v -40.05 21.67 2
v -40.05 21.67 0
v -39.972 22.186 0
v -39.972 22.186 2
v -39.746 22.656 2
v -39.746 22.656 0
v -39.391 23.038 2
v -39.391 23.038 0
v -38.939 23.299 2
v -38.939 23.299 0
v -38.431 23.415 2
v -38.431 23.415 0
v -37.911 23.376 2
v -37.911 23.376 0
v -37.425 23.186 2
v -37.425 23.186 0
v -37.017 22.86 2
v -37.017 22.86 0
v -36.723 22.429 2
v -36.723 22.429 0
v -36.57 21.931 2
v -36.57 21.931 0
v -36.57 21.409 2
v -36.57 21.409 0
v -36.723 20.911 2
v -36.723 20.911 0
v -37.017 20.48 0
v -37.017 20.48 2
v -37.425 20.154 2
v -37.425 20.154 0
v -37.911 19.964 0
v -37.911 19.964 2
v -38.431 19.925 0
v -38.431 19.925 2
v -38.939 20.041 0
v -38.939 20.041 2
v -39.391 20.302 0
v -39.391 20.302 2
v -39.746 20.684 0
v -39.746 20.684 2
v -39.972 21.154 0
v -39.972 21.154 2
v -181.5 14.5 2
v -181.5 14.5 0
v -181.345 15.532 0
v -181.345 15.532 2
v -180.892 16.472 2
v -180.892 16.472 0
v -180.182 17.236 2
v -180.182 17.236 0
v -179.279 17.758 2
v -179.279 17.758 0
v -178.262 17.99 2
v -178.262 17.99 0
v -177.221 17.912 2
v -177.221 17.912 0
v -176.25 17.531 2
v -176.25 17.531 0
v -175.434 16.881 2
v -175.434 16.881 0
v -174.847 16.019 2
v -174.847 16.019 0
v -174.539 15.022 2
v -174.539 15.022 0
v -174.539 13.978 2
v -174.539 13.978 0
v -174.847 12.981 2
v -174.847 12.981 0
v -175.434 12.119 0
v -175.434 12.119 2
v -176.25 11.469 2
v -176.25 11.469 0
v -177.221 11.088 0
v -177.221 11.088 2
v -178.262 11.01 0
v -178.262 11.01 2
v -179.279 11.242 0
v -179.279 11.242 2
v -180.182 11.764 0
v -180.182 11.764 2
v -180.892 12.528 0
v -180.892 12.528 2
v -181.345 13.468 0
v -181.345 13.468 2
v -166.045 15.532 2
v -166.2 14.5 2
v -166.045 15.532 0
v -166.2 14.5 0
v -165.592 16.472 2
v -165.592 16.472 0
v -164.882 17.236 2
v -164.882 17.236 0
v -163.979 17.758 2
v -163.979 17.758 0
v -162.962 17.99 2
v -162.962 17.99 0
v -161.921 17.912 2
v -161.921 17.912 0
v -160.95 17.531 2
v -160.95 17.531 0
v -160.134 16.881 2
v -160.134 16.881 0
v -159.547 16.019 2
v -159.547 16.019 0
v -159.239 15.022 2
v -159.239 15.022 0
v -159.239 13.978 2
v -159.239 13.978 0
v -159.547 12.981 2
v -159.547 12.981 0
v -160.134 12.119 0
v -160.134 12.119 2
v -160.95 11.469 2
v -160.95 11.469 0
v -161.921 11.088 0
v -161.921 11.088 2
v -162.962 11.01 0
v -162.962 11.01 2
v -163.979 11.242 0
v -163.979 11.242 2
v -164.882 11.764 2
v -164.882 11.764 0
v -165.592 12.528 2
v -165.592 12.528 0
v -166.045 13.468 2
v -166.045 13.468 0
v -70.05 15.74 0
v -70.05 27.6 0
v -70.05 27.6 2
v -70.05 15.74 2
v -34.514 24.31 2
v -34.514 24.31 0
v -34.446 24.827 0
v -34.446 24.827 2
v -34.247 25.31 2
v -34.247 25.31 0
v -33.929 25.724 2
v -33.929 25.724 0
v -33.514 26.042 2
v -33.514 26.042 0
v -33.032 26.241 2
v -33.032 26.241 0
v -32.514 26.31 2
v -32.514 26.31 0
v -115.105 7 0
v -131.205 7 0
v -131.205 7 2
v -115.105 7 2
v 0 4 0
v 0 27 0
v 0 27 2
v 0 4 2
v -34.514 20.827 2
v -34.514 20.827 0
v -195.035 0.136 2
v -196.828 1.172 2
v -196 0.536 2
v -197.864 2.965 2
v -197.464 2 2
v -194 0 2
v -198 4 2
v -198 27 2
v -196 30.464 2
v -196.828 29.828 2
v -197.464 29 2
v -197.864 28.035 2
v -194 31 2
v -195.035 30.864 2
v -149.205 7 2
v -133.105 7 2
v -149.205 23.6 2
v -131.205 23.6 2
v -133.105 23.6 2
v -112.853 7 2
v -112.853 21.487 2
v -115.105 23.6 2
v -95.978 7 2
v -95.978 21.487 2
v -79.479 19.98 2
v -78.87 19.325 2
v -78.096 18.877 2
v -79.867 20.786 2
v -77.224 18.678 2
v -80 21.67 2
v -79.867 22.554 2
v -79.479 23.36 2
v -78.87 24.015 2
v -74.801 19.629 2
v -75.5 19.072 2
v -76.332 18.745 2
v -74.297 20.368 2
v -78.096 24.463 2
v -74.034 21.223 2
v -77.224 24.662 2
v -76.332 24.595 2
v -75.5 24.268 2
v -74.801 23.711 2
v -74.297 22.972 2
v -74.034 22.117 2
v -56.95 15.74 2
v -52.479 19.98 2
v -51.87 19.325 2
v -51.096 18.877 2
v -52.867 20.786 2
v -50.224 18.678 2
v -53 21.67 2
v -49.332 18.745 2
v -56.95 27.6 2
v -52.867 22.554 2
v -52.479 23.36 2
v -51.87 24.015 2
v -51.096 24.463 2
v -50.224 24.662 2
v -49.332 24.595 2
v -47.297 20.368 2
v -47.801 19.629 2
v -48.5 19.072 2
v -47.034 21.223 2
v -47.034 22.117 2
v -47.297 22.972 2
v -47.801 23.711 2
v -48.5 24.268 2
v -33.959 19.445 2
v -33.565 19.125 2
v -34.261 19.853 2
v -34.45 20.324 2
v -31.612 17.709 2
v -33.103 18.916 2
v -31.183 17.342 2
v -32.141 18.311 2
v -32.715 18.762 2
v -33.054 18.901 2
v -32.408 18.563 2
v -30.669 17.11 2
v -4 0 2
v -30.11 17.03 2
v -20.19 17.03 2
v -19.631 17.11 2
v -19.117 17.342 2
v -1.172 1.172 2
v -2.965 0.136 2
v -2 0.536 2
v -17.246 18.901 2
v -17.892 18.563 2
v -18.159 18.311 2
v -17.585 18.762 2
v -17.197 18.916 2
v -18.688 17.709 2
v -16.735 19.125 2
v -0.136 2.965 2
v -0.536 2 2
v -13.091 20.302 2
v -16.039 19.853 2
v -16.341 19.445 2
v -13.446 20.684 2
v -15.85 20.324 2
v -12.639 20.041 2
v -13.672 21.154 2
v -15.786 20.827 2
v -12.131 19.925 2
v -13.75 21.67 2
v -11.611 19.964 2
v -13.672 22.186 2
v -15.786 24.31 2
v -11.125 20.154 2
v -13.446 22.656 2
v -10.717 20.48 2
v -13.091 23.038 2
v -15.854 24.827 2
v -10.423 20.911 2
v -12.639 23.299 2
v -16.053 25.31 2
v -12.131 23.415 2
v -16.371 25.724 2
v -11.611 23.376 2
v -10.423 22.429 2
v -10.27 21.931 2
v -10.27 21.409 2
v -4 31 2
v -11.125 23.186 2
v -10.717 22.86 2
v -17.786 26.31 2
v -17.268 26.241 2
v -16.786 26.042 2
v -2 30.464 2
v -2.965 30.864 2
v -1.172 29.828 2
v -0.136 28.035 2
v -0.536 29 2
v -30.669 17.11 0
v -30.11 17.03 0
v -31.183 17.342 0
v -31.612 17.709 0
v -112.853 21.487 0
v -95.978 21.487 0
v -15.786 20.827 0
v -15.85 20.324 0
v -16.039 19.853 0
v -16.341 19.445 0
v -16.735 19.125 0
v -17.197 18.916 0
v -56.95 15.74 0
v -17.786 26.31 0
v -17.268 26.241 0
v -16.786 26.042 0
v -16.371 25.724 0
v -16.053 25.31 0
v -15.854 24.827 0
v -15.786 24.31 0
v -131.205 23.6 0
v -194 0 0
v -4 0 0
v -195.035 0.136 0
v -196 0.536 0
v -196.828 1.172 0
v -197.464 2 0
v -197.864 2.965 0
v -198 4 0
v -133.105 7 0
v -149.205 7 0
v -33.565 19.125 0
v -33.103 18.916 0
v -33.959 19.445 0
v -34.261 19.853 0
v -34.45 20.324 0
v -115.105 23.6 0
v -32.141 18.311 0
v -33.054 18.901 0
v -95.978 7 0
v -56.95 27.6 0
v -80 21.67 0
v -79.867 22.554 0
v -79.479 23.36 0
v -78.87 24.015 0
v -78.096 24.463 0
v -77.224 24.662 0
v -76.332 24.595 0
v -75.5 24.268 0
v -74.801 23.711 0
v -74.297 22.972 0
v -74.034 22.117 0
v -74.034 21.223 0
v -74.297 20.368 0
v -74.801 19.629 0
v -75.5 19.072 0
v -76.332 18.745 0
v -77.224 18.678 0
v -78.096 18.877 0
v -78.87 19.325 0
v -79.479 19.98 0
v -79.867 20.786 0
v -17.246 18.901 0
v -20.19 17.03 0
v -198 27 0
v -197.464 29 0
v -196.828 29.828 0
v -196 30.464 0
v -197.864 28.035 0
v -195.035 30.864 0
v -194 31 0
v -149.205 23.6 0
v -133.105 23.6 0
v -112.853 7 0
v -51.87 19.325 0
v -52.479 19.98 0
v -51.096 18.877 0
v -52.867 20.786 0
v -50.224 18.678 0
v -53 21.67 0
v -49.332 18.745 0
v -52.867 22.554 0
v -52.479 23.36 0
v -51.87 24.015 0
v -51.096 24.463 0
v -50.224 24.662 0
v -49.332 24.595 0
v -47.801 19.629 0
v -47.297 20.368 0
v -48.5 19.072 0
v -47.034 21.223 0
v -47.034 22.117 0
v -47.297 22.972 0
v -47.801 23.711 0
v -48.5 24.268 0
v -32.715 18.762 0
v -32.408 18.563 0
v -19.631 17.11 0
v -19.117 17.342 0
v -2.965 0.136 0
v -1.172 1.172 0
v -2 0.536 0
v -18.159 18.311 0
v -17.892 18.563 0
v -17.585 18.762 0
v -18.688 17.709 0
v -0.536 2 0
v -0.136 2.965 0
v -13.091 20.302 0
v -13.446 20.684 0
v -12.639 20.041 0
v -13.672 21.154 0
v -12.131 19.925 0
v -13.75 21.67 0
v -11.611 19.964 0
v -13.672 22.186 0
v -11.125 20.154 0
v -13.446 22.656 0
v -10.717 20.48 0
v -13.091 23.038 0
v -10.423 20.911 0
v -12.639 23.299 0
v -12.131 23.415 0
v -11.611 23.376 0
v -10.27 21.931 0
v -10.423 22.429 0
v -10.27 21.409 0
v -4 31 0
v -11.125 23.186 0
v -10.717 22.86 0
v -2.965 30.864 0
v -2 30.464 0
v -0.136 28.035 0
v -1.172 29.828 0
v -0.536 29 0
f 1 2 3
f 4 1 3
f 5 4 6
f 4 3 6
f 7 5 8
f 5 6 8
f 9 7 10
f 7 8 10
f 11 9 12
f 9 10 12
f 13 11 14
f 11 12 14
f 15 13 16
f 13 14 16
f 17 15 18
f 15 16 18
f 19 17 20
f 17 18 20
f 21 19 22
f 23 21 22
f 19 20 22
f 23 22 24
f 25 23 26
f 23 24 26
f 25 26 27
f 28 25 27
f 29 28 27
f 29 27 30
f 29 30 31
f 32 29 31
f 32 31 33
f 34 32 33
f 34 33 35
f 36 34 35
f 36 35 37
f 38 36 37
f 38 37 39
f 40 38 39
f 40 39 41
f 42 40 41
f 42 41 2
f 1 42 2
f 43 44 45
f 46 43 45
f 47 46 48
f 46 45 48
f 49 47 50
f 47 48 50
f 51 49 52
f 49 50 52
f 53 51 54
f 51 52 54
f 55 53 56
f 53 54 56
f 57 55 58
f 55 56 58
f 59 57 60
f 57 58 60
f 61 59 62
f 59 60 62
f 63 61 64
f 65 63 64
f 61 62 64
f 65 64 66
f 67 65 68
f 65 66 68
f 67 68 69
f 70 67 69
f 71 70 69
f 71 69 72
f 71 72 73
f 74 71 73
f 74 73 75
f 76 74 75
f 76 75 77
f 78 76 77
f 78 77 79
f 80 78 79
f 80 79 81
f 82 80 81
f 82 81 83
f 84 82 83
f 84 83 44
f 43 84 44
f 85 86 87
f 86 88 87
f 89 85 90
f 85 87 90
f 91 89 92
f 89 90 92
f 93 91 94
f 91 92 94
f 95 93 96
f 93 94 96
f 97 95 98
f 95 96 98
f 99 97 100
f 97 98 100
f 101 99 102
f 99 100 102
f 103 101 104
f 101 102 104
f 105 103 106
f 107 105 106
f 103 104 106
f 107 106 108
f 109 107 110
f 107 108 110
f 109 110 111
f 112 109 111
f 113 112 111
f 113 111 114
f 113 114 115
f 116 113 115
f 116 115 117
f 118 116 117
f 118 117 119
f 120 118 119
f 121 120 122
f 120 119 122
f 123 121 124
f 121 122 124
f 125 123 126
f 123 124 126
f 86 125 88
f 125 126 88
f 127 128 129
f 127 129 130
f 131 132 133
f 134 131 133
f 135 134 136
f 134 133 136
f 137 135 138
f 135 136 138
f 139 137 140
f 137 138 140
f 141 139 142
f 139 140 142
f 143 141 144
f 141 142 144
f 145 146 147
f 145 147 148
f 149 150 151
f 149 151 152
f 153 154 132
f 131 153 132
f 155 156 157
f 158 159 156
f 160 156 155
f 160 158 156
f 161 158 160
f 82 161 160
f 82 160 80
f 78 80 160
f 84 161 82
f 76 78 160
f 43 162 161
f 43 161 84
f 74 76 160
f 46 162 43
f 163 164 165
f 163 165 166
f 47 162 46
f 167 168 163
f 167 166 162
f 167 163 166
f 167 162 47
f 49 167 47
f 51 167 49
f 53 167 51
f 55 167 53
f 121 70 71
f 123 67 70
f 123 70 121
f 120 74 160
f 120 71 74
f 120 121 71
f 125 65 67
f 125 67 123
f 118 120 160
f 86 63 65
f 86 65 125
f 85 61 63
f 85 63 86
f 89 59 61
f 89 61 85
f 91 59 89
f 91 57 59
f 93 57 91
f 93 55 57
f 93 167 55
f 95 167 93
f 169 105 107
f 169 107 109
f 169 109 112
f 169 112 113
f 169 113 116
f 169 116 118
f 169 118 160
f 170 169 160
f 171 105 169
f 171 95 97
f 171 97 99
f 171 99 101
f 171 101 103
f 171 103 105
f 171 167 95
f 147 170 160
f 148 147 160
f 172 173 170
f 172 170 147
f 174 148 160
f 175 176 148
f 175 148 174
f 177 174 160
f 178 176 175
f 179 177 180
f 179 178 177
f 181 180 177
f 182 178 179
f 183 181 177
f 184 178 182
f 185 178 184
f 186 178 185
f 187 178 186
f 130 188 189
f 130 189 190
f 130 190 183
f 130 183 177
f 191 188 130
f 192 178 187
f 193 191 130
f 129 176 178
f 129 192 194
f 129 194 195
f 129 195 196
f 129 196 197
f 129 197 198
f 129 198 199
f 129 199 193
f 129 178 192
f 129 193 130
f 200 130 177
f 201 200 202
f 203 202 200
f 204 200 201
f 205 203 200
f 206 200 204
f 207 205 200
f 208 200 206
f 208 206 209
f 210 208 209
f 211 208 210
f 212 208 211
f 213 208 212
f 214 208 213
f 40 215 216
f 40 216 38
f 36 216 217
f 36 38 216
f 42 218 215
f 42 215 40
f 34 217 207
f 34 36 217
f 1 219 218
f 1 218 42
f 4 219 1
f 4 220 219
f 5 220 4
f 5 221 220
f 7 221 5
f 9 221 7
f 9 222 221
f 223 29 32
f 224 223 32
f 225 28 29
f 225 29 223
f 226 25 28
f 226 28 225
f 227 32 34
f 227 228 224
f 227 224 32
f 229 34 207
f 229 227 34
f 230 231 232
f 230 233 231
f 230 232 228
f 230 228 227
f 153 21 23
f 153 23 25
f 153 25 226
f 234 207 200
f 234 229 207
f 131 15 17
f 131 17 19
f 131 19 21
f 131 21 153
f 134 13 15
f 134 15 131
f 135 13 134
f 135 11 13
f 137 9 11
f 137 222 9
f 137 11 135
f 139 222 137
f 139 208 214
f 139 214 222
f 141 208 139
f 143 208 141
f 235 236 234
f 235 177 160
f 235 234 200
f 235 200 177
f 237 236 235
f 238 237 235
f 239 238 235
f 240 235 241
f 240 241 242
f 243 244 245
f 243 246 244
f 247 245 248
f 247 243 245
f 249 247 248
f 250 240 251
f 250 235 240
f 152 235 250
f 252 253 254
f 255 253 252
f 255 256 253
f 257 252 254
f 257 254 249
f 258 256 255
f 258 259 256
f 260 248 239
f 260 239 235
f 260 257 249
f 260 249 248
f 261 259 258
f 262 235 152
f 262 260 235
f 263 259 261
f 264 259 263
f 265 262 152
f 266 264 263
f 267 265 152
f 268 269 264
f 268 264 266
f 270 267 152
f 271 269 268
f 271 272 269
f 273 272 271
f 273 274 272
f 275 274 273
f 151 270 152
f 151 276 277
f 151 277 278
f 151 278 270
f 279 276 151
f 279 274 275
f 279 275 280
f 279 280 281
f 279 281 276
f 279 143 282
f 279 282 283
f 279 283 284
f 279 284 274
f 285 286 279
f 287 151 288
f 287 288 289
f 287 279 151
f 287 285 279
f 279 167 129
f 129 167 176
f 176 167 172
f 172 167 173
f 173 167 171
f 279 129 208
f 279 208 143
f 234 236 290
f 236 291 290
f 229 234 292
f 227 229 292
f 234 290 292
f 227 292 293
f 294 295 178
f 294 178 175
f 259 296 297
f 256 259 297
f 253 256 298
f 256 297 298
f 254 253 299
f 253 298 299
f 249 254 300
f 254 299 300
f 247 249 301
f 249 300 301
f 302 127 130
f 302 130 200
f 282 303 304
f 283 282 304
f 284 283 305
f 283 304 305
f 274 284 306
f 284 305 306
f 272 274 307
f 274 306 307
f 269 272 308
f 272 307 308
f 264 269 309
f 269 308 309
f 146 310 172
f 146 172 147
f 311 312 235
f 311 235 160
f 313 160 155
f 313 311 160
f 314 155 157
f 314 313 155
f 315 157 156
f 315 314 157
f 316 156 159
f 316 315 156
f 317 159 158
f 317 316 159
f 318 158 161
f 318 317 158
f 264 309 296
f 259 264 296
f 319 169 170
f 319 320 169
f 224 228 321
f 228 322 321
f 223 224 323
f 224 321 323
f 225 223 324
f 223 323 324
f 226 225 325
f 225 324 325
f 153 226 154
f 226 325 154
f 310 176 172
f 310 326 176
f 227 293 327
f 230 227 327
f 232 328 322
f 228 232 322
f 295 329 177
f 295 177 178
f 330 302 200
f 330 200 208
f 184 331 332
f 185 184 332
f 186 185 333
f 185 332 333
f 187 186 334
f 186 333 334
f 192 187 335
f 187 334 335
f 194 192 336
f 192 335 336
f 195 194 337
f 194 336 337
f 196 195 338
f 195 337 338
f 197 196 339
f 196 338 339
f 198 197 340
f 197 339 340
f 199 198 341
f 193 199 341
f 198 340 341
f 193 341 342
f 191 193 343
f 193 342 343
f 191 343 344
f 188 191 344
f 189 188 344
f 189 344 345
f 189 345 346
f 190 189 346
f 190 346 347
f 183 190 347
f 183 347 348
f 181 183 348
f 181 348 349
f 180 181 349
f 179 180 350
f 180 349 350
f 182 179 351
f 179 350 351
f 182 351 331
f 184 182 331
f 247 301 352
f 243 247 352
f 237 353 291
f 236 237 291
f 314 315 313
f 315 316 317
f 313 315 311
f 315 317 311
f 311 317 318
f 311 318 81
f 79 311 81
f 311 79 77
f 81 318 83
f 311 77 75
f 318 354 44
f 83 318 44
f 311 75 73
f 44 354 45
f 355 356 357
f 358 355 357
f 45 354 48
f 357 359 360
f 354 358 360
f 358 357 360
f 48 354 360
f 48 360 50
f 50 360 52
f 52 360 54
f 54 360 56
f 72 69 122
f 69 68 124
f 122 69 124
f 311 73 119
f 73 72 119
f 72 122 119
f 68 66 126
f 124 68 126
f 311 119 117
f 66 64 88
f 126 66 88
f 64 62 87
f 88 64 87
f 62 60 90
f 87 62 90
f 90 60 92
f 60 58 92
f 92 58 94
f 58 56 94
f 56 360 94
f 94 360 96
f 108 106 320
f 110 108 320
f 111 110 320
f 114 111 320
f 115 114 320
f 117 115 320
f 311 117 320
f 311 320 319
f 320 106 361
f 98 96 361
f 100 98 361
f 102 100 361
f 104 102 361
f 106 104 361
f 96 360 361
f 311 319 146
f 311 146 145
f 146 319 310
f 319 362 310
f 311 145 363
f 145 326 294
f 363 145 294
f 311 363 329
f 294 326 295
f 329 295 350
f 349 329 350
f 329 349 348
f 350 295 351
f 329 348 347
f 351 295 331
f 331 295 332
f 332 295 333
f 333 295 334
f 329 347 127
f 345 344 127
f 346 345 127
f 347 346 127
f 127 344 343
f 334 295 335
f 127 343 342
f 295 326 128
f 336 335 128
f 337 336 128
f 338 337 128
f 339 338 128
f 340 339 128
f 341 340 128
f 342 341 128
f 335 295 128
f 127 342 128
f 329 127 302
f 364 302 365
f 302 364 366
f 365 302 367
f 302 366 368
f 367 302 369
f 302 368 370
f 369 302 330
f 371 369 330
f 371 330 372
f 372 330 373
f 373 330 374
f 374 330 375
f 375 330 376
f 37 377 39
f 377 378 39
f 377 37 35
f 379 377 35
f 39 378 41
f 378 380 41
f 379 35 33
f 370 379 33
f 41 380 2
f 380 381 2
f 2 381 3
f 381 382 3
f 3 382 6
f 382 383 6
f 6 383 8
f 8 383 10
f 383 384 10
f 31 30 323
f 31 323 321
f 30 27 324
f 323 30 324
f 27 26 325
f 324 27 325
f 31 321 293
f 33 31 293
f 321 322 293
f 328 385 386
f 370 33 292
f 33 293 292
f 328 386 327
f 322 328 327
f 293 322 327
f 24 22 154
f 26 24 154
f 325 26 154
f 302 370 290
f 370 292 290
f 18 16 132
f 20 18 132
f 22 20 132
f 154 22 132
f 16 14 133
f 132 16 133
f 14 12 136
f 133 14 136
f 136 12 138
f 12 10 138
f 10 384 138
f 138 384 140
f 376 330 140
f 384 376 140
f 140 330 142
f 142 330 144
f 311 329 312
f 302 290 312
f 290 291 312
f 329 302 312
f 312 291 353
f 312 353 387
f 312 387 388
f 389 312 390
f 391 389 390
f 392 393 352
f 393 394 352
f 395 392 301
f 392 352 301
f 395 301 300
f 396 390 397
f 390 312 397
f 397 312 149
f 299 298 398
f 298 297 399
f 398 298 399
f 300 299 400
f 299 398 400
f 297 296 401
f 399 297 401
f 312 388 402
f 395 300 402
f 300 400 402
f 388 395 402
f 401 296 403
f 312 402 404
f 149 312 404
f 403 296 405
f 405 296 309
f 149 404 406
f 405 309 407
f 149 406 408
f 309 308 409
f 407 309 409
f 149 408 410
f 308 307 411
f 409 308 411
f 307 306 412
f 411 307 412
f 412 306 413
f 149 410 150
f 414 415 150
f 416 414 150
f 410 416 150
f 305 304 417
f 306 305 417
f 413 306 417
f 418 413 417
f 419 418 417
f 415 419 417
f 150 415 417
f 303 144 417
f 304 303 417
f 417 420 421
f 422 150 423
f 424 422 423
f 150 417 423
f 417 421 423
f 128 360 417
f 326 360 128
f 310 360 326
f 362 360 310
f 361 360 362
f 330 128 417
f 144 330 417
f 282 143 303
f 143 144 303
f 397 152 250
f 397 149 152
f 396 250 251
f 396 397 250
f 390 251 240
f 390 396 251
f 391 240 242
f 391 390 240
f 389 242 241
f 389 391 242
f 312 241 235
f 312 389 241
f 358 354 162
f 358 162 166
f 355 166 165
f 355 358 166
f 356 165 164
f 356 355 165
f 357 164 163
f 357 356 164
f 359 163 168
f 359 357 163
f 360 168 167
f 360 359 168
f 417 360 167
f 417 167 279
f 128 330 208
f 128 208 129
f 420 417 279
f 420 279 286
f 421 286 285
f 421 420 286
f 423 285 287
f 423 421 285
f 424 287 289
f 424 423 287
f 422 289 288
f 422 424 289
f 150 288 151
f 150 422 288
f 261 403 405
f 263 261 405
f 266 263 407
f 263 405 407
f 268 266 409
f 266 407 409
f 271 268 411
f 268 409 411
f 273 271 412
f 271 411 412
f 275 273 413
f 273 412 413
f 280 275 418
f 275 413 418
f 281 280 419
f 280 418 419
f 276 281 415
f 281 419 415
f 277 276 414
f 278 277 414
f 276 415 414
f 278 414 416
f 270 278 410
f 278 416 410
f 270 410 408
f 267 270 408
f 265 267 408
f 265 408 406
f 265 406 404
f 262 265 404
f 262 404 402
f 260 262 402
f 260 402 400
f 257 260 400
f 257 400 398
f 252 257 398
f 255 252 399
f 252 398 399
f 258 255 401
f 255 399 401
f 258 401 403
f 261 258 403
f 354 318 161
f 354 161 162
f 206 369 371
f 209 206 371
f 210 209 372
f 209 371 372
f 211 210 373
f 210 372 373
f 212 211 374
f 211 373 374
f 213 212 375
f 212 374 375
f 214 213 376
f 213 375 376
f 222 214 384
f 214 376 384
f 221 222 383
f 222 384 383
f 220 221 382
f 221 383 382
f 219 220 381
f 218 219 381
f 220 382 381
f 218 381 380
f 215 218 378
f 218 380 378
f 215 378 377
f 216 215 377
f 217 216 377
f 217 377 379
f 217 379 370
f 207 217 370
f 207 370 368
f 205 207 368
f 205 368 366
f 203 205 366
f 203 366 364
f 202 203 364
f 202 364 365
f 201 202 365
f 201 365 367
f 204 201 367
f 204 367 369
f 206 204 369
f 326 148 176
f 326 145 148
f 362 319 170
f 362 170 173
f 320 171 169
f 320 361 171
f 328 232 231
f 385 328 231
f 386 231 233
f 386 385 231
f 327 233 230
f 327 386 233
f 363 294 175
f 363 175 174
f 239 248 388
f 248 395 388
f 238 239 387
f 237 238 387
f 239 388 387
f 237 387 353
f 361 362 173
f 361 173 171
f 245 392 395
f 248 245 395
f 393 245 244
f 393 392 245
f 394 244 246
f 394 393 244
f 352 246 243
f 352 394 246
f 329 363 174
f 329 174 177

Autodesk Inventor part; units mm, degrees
ref_plane "YZ Plane" through (0, 0, 0) normal (1, 0, 0) x (0, 1, 0)
ref_plane "XZ Plane" through (0, 0, 0) normal (0, 1, 0) x (-1, 0, 0)
ref_plane "XY Plane" through (0, 0, 0) normal (0, 0, 1) x (1, 0, 0)
sketch "Sketch1" plane through (0, 0, 0) normal (0, 0, 1) x (1, 0, 0)
  line L0 (-4, 0) -> (-194, 0)
  line L1 (-198, 4) -> (-198, 27)
  line L2 (-194, 31) -> (-4, 31)
  line L3 (0, 27) -> (0, 4)
  arc A0 (0, 27) -> (-4, 31) centre (-4, 27) ccw
  arc A1 (-194, 31) -> (-198, 27) centre (-194, 27) ccw
  arc A2 (-198, 4) -> (-194, 0) centre (-194, 4) ccw
  arc A3 (-4, 0) -> (0, 4) centre (-4, 4) ccw
  point P0 (0, 0)
  point P1 (-198, 0)
  point P2 (0, 31)
  dimension "d0" = 198
  dimension "d1" = 31
  dimension "d2" = 4
extrude "Extrusion1" add sketch "Sketch1" along normal blind 2
sketch "Sketch2" plane through (0, 0, 0) normal (0, 0, -1) x (-1, 0, 0)
  line L0 (95.9784, 21.4874) -> (112.8534, 21.4874)
  line L1 (112.8534, 21.4874) -> (112.8534, 7)
  line L2 (112.8534, 7) -> (95.9784, 7)
  line L3 (95.9784, 7) -> (95.9784, 21.4874)
  line L4 (194, 0) -> (4, 0) projected
  line L5 (0, 4) -> (0, 27) projected
  line L6 (115.1046, 23.6) -> (131.2046, 23.6)
  line L7 (131.2046, 23.6) -> (131.2046, 7)
  line L8 (131.2046, 7) -> (115.1046, 7)
  line L9 (115.1046, 7) -> (115.1046, 23.6)
  line L10 (133.1046, 23.6) -> (149.2046, 23.6)
  line L11 (149.2046, 23.6) -> (149.2046, 7)
  line L12 (149.2046, 7) -> (133.1046, 7)
  line L13 (133.1046, 7) -> (133.1046, 23.6)
  circle A0 centre (162.7, 14.5) radius 3.5
  circle A1 centre (178, 14.5) radius 3.5
  line L14 (198, 27) -> (198, 4) projected
  line L15 (70.05, 15.74) -> (56.95, 15.74)
  line L16 (56.95, 15.74) -> (56.95, 27.6)
  line L17 (56.95, 27.6) -> (70.05, 27.6)
  line L18 (70.05, 27.6) -> (70.05, 15.74)
  circle A2 centre (77, 21.67) radius 3
  circle A3 centre (50, 21.67) radius 3
  line L19 (63.5, 15.74) -> (63.5, 8.0383)
  line L20 (32.5145, 26.3095) -> (17.7855, 26.3095)
  line L21 (15.7855, 24.3095) -> (15.7855, 20.8274)
  line L22 (17.1974, 18.9158) -> (17.2455, 18.901)
  line L23 (18.1588, 18.3108) -> (18.6882, 17.7092)
  line L24 (20.1896, 17.0305) -> (30.1104, 17.0305)
  line L25 (31.6118, 17.7092) -> (32.1412, 18.3108)
  line L26 (33.0545, 18.901) -> (33.1026, 18.9158)
  line L27 (34.5145, 20.8274) -> (34.5145, 24.3095)
  circle A4 centre (38.3, 21.67) radius 1.75
  circle A5 centre (12, 21.67) radius 1.75
  arc A6 (33.1026, 18.9158) -> (34.5145, 20.8274) centre (32.5145, 20.8274) ccw
  arc A7 (33.0545, 18.901) -> (32.1412, 18.3108) centre (33.6426, 16.9895) ccw
  arc A8 (30.1104, 17.0305) -> (31.6118, 17.7092) centre (30.1104, 19.0305) ccw
  arc A9 (18.6882, 17.7092) -> (20.1896, 17.0305) centre (20.1896, 19.0305) ccw
  arc A10 (18.1588, 18.3108) -> (17.2455, 18.901) centre (16.6574, 16.9895) ccw
  arc A11 (15.7855, 20.8274) -> (17.1974, 18.9158) centre (17.7855, 20.8274) ccw
  arc A12 (17.7855, 26.3095) -> (15.7855, 24.3095) centre (17.7855, 24.3095) ccw
  arc A13 (34.5145, 24.3095) -> (32.5145, 26.3095) centre (32.5145, 24.3095) ccw
  point P0 (0, 0)
  point P1 (34.5145, 26.3095)
  point P2 (15.7855, 26.3095)
  point P3 (15.7855, 19.3502)
  point P4 (17.7855, 18.7349)
  point P5 (19.2855, 17.0305)
  point P6 (31.0145, 17.0305)
  point P7 (32.5145, 18.7349)
  point P8 (34.5145, 19.3502)
  dimension "d7" = 16.875
  dimension "d8" = 14.4874
  dimension "d9" = 7
  dimension "d11" = 2.2512
  dimension "d12" = 1.9
  dimension "d13" = 16.1
  dimension "d14" = 16.1
  dimension "d15" = 16.6
  dimension "d16" = 7
  dimension "d17" = 7
  dimension "d18" = 7.5
  dimension "d19" = 13.4954
  dimension "d20" = 15.3
  dimension "d21" = 20
  dimension "d22" = 13.1
  dimension "d23" = 11.86
  dimension "d26" = 27
  dimension "d27" = 6
  dimension "d28" = 13.5
  dimension "d29" = 5.93
  dimension "d30" = 9.279
  dimension "d31" = 18.729
  dimension "d32" = 107.1
  dimension "d33" = 107.1
  dimension "d34" = 138.65
  dimension "d35" = 138.65
  dimension "d36" = 2
  dimension "d37" = 2
  dimension "d38" = 3.5
  dimension "d39" = 3.5
  dimension "d40" = 3.5
  dimension "d41" = 26.3
  dimension "d42" = 3.7855
  dimension "d43" = 4.6395
  dimension "d45" = 2
  dimension "d47" = 50
  dimension "d48" = 12
  dimension "d49" = 4
extrude "Extrusion2" cut sketch "Sketch2" against normal through all
equation "\"d0\" = caseBottomWidth - thickness"
equation "\"d1\" = -thickness + 2 * caseBottomHeight - lipHeight"
equation "\"d2\" = filletMid"
equation "\"d3\" = thickness"
equation "\"d14\" = d13"
equation "\"d21\" = offsetFromSideOfCase"
equation "\"d28\" = 0.5 * d26"
equation "\"d29\" = 0.5 * d23"
equation "\"d33\" = d32"
equation "\"d35\" = d34"
equation "\"d37\" = d36"
equation "\"d39\" = d38"
equation "\"d42\" = -0.5 * d31 + 0.5 * d41"
equation "\"d43\" = 0.5 * d30"
equation "\"d5\" = thickness"
equation "\"filletMid\" = 4"
equation "\"thickness\" = 2"
equation "\"offsetFromSideOfCase\" = 20"
equation "\"caseBottomWidth\" = 200"
equation "\"caseBottomHeight\" = 17"
equation "\"lipHeight\" = 1"
properties part number "case-back"
